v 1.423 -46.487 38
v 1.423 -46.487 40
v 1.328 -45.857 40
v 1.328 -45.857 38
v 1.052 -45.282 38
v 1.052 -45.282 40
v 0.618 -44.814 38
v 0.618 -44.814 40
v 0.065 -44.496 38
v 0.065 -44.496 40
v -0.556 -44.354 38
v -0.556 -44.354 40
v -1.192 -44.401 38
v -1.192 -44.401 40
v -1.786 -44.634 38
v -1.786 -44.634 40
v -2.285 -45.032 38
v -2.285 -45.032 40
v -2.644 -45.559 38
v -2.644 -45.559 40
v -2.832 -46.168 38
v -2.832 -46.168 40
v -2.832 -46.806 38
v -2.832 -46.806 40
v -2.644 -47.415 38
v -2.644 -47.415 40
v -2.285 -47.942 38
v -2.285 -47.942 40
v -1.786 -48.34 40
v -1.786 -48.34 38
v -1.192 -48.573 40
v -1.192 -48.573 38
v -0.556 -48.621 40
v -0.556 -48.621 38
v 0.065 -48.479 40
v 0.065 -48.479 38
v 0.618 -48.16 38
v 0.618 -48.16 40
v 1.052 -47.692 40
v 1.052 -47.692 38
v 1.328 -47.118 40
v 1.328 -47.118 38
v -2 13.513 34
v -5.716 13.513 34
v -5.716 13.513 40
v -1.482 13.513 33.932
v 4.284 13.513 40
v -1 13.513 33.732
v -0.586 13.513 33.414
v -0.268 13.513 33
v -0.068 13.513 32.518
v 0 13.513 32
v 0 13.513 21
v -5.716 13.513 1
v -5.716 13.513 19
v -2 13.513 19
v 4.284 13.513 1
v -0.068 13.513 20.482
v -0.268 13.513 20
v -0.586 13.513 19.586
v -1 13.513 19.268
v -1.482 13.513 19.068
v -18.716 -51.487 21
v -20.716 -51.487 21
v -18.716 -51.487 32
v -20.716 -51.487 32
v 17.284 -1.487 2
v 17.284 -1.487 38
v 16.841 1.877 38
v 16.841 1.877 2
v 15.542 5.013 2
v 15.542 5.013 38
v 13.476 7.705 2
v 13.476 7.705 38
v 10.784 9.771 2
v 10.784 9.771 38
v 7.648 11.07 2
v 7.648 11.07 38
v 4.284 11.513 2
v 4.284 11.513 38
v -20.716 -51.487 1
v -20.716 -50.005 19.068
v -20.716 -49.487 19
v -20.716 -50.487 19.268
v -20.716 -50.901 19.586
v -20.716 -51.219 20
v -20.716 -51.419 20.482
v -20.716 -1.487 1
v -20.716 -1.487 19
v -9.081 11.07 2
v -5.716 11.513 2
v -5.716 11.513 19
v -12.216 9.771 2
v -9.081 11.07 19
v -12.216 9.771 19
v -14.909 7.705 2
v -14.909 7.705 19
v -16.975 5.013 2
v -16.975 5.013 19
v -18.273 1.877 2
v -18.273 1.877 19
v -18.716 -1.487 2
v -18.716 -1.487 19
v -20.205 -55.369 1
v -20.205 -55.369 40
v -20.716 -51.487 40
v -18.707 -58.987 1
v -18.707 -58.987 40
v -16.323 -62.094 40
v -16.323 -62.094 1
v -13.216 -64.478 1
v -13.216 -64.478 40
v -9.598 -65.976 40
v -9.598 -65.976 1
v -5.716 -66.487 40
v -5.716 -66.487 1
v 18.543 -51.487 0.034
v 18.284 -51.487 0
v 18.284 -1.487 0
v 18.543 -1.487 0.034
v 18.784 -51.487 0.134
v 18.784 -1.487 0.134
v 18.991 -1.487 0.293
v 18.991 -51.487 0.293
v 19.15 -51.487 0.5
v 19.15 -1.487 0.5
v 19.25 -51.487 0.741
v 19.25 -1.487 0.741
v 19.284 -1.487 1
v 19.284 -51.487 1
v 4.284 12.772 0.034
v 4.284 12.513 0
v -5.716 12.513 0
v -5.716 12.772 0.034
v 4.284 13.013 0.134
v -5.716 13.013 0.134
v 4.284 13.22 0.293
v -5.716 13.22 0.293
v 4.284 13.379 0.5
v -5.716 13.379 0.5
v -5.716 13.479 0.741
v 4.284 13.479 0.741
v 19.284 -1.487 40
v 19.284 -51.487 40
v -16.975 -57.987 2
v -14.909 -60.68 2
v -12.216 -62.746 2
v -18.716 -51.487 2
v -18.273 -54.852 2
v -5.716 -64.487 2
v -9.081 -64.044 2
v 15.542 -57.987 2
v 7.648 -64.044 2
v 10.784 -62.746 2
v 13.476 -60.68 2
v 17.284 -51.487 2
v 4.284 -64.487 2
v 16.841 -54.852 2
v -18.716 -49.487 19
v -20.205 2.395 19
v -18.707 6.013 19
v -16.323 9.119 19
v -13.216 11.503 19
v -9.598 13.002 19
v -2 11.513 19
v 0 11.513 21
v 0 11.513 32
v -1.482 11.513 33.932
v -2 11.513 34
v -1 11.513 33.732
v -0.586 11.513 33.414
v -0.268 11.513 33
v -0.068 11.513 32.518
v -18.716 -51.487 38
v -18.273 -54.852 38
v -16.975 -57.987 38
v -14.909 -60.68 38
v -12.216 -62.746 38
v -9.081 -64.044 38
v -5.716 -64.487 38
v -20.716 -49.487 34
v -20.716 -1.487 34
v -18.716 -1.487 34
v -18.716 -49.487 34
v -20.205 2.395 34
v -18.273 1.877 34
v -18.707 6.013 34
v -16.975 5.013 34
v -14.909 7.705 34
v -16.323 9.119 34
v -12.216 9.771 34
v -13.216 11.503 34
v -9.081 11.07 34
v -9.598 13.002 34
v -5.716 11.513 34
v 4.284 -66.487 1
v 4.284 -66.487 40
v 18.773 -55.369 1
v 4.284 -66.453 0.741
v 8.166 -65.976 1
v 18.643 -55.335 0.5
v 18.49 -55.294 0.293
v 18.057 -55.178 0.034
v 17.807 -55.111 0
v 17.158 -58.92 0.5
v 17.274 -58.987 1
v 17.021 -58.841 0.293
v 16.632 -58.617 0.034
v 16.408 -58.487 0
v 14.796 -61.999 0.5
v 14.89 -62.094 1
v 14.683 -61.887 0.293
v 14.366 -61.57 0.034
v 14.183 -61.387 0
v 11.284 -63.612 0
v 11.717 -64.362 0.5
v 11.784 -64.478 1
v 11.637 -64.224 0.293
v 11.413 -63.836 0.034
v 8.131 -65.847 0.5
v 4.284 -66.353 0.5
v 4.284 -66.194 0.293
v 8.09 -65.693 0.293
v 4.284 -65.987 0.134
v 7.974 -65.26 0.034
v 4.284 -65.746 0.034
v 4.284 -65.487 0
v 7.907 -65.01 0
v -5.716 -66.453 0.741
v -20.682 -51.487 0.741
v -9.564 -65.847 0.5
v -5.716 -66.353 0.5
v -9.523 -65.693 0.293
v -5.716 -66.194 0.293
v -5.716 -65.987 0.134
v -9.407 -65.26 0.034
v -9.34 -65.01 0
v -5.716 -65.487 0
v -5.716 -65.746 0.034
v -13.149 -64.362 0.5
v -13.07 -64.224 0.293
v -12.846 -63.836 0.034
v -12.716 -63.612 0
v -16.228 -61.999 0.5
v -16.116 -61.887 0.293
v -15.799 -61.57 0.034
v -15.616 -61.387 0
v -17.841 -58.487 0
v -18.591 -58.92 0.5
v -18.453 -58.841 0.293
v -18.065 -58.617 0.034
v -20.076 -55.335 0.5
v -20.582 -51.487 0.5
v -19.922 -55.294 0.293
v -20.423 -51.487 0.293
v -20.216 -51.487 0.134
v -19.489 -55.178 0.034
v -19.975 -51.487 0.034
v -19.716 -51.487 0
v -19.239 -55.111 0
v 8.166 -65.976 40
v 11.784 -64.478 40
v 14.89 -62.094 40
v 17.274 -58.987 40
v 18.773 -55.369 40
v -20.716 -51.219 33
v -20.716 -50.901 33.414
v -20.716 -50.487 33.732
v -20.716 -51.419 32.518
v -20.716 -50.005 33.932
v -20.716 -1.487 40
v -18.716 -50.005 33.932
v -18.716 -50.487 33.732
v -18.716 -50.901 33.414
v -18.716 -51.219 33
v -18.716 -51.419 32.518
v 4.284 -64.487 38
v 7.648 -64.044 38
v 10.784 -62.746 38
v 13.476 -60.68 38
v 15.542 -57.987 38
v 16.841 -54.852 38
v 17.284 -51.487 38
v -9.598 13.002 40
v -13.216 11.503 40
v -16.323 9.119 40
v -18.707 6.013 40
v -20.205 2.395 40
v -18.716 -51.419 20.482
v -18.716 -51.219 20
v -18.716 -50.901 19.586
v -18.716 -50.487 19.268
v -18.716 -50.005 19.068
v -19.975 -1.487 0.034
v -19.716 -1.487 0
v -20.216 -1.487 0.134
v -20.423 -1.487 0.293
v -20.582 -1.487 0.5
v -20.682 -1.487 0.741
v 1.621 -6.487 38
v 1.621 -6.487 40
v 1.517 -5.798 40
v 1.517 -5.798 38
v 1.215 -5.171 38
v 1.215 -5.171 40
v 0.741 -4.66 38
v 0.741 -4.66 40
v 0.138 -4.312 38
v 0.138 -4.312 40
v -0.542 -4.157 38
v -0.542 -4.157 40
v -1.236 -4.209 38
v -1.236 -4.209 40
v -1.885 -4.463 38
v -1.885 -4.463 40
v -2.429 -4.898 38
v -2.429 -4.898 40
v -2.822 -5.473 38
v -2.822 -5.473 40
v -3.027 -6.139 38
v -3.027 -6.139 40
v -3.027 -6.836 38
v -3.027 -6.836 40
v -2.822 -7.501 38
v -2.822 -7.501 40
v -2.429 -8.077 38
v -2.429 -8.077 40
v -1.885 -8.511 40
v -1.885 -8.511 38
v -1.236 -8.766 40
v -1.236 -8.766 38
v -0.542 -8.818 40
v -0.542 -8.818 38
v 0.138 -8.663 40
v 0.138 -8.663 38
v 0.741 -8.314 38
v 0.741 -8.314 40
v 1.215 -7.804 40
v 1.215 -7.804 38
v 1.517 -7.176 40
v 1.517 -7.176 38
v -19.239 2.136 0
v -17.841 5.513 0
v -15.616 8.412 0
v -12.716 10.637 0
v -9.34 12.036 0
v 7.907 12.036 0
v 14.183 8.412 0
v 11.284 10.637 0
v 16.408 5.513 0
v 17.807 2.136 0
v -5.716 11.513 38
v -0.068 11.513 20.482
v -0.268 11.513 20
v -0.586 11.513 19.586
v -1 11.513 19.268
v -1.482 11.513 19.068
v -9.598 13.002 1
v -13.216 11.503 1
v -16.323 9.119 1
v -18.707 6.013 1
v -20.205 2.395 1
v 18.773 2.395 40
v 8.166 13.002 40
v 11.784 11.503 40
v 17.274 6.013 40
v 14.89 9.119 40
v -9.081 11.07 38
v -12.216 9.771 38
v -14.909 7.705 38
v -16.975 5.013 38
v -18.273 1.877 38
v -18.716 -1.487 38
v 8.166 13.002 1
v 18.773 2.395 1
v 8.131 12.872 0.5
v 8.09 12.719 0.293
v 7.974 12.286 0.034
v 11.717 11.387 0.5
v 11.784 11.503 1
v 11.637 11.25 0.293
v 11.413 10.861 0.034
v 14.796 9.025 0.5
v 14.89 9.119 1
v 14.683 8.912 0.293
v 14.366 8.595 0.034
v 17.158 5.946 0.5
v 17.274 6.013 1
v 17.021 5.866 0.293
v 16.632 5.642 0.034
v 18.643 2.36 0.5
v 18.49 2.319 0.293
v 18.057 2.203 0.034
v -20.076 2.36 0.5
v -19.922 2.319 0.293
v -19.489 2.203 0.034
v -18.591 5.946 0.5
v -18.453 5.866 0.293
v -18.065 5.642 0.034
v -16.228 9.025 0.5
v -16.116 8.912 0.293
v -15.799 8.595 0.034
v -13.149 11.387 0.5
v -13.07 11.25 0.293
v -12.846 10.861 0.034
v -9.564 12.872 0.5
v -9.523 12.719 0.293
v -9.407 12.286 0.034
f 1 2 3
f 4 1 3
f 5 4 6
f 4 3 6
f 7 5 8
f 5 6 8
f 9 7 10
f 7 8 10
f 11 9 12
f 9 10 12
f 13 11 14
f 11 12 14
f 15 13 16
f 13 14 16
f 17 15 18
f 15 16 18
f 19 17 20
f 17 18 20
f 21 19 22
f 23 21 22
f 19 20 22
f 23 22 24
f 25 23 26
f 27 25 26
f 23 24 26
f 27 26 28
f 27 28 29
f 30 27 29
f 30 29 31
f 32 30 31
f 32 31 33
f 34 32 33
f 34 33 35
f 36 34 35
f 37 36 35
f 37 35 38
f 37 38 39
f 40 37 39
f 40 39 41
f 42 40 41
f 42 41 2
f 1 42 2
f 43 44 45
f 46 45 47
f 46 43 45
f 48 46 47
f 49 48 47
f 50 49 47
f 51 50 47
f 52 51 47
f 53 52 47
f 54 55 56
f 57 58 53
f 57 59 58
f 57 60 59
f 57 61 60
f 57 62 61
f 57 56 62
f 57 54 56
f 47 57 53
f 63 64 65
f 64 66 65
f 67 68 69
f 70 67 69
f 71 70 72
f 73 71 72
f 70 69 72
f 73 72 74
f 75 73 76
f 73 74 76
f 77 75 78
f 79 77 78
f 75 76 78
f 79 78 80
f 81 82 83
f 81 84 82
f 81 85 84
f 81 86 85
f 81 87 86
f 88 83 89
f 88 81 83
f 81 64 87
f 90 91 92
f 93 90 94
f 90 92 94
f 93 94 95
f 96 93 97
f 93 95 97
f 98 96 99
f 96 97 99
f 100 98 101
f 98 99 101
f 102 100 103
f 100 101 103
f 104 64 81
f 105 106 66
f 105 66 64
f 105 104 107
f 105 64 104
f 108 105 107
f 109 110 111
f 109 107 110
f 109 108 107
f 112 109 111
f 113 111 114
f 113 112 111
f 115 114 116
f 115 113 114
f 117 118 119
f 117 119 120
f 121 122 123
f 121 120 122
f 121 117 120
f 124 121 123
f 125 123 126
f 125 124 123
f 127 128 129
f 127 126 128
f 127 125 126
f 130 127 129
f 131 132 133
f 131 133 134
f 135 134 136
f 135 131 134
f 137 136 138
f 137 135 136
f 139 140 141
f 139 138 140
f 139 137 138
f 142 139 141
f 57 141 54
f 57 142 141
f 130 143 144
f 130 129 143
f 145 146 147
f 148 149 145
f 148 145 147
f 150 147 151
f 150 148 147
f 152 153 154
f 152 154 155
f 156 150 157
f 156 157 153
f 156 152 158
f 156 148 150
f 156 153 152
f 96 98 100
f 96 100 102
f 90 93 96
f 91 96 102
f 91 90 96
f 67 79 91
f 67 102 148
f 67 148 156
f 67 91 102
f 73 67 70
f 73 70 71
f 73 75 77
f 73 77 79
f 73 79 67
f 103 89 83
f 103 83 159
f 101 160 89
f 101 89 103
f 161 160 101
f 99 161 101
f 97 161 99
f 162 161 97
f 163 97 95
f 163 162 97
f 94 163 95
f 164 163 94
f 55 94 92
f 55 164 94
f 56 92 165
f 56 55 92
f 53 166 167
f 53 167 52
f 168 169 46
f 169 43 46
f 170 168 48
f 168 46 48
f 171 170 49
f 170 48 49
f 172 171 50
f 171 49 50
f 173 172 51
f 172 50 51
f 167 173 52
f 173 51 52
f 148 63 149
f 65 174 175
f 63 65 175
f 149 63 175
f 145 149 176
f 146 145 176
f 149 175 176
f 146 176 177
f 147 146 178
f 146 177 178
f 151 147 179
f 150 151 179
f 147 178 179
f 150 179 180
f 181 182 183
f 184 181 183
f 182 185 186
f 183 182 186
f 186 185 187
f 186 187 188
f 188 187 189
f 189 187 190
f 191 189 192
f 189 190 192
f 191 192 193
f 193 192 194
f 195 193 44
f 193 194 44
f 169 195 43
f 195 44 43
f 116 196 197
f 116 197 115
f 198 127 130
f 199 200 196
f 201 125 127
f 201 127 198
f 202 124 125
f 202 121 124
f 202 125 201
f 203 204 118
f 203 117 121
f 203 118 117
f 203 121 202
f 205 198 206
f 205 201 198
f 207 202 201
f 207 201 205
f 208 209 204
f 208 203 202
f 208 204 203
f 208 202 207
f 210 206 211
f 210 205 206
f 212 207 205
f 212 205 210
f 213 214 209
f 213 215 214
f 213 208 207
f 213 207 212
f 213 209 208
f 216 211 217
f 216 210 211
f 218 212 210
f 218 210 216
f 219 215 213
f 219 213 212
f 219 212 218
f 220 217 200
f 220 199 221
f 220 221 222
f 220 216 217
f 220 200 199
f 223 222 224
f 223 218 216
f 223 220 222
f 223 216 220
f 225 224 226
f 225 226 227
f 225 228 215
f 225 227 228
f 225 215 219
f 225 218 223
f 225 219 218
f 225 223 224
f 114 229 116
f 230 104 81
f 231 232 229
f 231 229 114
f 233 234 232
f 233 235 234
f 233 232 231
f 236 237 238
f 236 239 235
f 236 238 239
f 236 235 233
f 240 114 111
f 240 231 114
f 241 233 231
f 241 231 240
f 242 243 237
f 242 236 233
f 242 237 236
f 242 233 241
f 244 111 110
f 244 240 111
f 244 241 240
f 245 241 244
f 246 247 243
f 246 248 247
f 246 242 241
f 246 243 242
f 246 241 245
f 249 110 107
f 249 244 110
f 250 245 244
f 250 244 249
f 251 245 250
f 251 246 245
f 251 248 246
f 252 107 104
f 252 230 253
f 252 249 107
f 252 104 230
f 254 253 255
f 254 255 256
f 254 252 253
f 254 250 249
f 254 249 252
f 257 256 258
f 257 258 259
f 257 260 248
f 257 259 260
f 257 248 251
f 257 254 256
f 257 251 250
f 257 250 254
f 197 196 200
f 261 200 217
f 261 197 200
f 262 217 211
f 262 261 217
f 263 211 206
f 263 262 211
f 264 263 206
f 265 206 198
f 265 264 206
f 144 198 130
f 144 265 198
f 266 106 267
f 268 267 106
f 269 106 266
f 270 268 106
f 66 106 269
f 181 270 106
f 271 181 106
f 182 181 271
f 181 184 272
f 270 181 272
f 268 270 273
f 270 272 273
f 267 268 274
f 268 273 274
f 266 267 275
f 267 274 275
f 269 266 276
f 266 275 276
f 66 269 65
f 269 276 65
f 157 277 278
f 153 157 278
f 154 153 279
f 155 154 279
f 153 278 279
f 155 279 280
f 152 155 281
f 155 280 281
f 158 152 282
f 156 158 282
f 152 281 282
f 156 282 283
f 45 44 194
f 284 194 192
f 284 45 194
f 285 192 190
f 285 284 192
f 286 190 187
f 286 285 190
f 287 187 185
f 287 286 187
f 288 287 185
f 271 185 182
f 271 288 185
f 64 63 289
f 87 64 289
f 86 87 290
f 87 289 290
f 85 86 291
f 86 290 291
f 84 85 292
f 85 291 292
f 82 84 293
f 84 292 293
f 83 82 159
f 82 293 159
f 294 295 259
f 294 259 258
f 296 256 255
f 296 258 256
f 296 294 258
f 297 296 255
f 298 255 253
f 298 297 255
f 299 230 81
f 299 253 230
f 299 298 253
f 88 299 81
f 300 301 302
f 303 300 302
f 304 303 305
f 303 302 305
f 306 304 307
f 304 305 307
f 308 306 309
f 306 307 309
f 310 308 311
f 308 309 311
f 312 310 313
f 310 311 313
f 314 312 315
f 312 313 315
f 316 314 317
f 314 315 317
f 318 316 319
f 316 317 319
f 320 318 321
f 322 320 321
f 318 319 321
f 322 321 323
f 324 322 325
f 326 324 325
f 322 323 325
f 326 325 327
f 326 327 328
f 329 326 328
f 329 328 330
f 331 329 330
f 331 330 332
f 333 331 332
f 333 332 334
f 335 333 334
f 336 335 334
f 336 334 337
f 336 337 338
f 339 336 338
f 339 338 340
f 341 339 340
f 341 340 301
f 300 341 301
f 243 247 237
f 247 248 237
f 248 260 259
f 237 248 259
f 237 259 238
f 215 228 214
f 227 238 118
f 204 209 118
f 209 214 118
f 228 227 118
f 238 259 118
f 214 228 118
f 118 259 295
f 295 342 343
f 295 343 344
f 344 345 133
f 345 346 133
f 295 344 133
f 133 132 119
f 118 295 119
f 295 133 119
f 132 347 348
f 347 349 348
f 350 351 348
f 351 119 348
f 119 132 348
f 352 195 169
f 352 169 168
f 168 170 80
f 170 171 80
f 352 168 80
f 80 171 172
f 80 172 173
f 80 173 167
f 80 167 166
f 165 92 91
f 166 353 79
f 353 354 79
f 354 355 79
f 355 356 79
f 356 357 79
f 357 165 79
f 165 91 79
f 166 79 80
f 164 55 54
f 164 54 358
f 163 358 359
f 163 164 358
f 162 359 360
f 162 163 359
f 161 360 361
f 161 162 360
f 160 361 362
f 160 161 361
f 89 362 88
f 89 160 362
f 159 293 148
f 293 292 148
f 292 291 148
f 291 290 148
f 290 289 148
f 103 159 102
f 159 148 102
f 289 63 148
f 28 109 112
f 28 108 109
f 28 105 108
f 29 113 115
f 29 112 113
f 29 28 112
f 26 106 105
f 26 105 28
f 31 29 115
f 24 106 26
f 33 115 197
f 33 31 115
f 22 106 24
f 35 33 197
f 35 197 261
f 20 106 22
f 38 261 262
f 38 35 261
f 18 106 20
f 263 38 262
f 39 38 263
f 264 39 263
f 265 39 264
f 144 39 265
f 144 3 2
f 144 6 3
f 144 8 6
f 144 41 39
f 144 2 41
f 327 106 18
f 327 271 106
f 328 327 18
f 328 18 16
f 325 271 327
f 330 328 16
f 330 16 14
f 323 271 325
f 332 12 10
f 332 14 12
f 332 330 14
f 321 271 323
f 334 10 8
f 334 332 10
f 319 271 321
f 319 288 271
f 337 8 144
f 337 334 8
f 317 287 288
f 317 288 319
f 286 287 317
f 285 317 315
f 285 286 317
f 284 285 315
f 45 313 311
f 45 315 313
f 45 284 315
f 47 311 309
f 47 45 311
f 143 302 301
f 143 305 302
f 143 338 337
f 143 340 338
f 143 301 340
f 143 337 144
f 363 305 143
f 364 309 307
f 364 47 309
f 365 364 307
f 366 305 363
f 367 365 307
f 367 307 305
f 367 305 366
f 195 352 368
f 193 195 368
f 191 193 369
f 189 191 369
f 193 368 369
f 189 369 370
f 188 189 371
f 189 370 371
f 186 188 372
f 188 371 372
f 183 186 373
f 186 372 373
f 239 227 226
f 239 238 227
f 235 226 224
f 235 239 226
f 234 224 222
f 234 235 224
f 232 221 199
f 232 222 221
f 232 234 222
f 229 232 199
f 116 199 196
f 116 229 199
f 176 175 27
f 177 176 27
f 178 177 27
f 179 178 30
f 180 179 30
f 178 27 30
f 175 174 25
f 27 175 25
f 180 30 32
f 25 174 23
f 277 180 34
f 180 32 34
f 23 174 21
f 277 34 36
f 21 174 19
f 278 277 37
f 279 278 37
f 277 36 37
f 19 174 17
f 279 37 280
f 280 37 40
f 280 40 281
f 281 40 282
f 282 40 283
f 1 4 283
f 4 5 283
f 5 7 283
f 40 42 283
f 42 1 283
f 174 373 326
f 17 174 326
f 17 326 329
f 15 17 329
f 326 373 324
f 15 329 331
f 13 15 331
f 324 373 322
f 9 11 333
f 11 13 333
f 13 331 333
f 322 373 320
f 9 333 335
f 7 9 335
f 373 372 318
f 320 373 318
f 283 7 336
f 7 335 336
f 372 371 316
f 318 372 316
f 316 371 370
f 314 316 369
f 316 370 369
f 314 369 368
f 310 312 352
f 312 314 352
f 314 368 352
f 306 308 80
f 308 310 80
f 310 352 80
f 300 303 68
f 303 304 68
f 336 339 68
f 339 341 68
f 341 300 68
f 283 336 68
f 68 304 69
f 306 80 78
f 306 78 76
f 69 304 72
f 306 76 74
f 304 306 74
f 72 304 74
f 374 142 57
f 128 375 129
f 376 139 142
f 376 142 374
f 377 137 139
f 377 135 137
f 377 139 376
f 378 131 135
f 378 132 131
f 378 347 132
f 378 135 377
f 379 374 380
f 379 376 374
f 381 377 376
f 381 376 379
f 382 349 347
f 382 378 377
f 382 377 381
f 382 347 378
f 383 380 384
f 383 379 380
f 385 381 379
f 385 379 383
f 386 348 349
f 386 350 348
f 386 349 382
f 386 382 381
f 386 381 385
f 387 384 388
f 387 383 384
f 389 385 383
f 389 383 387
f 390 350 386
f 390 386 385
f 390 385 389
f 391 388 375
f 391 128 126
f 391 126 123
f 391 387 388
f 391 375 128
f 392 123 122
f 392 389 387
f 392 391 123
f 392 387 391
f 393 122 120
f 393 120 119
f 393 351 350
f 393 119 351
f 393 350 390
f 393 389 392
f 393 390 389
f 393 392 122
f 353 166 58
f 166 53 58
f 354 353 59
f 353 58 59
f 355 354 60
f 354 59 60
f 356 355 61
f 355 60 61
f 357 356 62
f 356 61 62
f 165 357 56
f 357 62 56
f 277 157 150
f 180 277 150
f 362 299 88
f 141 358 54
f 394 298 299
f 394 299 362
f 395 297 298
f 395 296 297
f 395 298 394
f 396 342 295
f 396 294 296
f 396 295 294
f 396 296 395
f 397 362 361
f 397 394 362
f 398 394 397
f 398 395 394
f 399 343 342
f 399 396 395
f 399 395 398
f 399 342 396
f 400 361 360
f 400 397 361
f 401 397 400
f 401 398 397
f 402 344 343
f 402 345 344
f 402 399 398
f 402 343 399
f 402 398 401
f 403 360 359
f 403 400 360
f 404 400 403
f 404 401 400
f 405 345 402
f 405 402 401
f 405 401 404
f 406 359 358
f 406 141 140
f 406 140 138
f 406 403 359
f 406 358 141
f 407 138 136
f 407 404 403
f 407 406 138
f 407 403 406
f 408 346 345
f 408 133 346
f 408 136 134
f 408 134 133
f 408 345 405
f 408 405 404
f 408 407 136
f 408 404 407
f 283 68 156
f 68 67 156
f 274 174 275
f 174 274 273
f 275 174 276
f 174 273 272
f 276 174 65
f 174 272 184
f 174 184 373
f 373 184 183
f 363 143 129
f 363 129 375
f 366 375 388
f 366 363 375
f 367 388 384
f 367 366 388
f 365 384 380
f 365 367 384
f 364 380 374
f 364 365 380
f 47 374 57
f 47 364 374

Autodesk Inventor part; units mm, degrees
ref_plane "YZ Plane" through (0, 0, 0) normal (1, 0, 0) x (0, 1, 0)
ref_plane "XZ Plane" through (0, 0, 0) normal (0, 1, 0) x (-1, 0, 0)
ref_plane "XY Plane" through (0, 0, 0) normal (0, 0, 1) x (1, 0, 0)
sketch "Sketch1" plane through (0, 0, 0) normal (0, 0, 1) x (1, 0, 0)
  line L0 (-20.7162, 13.5128) -> (19.2838, 13.5128)
  line L1 (19.2838, 13.5128) -> (19.2838, -66.4872)
  line L2 (19.2838, -66.4872) -> (-20.7162, -66.4872)
  line L3 (-20.7162, -66.4872) -> (-20.7162, 13.5128)
  point P0 (0, 0)
  dimension "d0" = 40
  dimension "d1" = 80
extrude "Extrusion1" add sketch "Sketch1" along normal blind 40
fillet "Fillet1" radius 15 4 edges at (-20.7162, 13.5128, 20) (19.2838, 13.5128, 20) (-20.7162, -66.4872, 20) (19.2838, -66.4872, 20)
shell "Shell1" thickness 2 removed faces 0
ref_plane "Work Plane1" through (0, 0, 34) normal (0, 0, 1) x (1, 0, 0)
sketch "Sketch3" plane through (0, 0, 34) normal (0, 0, 1) x (1, 0, 0)
  arc A0 (-5.7162, 13.5128) -> (-20.7162, -1.4872) centre (-5.7162, -1.4872) ccw projected
  line L0 (-20.7162, -1.4872) -> (-20.7162, -51.4872) projected
  line L1 (-20.7162, -51.4872) -> (0, -51.4872)
  line L2 (0, -51.4872) -> (0, 13.5128)
  line L3 (0, 13.5128) -> (-5.7162, 13.5128)
  point P0 (0, 0)
extrude "Extrusion2" cut sketch "Sketch3" against normal blind 15
fillet "Fillet3" radius 2 4 edges at (0, 12.5128, 19) (0, 12.5128, 34) (-19.7162, -51.4872, 34) (-19.7162, -51.4872, 19)
sketch "Sketch4" plane through (0, 0, 40) normal (0, 0, 1) x (1, 0, 0)
  circle A0 centre (-0.7162, -46.4872) radius 2.1395
  circle A1 centre (-0.7162, -6.4872) radius 2.337
  line L0 (-20.7162, -1.4872) -> (-20.7162, -51.4872) projected
  line L1 (4.2838, 13.5128) -> (-5.7162, 13.5128) projected
  line L2 (-5.7162, -66.4872) -> (4.2838, -66.4872) projected
  point P0 (0, 0)
  dimension "d11" = 20
  dimension "d12" = 20
  dimension "d13" = 20
  dimension "d14" = 20
extrude "Extrusion3" cut sketch "Sketch4" against normal up to next
fillet "Fillet4" radius 1 8 edges at (-0.7162, 13.5128, 0) (-16.3228, 9.1194, 0) (-20.7162, -26.4872, 0) (-16.3228, -62.0938, 0) (-0.7162, -66.4872, 0) (14.8904, -62.0938, 0) (19.2838, -26.4872, 0) (14.8904, 9.1194, 0)
properties part number "lock-case"
